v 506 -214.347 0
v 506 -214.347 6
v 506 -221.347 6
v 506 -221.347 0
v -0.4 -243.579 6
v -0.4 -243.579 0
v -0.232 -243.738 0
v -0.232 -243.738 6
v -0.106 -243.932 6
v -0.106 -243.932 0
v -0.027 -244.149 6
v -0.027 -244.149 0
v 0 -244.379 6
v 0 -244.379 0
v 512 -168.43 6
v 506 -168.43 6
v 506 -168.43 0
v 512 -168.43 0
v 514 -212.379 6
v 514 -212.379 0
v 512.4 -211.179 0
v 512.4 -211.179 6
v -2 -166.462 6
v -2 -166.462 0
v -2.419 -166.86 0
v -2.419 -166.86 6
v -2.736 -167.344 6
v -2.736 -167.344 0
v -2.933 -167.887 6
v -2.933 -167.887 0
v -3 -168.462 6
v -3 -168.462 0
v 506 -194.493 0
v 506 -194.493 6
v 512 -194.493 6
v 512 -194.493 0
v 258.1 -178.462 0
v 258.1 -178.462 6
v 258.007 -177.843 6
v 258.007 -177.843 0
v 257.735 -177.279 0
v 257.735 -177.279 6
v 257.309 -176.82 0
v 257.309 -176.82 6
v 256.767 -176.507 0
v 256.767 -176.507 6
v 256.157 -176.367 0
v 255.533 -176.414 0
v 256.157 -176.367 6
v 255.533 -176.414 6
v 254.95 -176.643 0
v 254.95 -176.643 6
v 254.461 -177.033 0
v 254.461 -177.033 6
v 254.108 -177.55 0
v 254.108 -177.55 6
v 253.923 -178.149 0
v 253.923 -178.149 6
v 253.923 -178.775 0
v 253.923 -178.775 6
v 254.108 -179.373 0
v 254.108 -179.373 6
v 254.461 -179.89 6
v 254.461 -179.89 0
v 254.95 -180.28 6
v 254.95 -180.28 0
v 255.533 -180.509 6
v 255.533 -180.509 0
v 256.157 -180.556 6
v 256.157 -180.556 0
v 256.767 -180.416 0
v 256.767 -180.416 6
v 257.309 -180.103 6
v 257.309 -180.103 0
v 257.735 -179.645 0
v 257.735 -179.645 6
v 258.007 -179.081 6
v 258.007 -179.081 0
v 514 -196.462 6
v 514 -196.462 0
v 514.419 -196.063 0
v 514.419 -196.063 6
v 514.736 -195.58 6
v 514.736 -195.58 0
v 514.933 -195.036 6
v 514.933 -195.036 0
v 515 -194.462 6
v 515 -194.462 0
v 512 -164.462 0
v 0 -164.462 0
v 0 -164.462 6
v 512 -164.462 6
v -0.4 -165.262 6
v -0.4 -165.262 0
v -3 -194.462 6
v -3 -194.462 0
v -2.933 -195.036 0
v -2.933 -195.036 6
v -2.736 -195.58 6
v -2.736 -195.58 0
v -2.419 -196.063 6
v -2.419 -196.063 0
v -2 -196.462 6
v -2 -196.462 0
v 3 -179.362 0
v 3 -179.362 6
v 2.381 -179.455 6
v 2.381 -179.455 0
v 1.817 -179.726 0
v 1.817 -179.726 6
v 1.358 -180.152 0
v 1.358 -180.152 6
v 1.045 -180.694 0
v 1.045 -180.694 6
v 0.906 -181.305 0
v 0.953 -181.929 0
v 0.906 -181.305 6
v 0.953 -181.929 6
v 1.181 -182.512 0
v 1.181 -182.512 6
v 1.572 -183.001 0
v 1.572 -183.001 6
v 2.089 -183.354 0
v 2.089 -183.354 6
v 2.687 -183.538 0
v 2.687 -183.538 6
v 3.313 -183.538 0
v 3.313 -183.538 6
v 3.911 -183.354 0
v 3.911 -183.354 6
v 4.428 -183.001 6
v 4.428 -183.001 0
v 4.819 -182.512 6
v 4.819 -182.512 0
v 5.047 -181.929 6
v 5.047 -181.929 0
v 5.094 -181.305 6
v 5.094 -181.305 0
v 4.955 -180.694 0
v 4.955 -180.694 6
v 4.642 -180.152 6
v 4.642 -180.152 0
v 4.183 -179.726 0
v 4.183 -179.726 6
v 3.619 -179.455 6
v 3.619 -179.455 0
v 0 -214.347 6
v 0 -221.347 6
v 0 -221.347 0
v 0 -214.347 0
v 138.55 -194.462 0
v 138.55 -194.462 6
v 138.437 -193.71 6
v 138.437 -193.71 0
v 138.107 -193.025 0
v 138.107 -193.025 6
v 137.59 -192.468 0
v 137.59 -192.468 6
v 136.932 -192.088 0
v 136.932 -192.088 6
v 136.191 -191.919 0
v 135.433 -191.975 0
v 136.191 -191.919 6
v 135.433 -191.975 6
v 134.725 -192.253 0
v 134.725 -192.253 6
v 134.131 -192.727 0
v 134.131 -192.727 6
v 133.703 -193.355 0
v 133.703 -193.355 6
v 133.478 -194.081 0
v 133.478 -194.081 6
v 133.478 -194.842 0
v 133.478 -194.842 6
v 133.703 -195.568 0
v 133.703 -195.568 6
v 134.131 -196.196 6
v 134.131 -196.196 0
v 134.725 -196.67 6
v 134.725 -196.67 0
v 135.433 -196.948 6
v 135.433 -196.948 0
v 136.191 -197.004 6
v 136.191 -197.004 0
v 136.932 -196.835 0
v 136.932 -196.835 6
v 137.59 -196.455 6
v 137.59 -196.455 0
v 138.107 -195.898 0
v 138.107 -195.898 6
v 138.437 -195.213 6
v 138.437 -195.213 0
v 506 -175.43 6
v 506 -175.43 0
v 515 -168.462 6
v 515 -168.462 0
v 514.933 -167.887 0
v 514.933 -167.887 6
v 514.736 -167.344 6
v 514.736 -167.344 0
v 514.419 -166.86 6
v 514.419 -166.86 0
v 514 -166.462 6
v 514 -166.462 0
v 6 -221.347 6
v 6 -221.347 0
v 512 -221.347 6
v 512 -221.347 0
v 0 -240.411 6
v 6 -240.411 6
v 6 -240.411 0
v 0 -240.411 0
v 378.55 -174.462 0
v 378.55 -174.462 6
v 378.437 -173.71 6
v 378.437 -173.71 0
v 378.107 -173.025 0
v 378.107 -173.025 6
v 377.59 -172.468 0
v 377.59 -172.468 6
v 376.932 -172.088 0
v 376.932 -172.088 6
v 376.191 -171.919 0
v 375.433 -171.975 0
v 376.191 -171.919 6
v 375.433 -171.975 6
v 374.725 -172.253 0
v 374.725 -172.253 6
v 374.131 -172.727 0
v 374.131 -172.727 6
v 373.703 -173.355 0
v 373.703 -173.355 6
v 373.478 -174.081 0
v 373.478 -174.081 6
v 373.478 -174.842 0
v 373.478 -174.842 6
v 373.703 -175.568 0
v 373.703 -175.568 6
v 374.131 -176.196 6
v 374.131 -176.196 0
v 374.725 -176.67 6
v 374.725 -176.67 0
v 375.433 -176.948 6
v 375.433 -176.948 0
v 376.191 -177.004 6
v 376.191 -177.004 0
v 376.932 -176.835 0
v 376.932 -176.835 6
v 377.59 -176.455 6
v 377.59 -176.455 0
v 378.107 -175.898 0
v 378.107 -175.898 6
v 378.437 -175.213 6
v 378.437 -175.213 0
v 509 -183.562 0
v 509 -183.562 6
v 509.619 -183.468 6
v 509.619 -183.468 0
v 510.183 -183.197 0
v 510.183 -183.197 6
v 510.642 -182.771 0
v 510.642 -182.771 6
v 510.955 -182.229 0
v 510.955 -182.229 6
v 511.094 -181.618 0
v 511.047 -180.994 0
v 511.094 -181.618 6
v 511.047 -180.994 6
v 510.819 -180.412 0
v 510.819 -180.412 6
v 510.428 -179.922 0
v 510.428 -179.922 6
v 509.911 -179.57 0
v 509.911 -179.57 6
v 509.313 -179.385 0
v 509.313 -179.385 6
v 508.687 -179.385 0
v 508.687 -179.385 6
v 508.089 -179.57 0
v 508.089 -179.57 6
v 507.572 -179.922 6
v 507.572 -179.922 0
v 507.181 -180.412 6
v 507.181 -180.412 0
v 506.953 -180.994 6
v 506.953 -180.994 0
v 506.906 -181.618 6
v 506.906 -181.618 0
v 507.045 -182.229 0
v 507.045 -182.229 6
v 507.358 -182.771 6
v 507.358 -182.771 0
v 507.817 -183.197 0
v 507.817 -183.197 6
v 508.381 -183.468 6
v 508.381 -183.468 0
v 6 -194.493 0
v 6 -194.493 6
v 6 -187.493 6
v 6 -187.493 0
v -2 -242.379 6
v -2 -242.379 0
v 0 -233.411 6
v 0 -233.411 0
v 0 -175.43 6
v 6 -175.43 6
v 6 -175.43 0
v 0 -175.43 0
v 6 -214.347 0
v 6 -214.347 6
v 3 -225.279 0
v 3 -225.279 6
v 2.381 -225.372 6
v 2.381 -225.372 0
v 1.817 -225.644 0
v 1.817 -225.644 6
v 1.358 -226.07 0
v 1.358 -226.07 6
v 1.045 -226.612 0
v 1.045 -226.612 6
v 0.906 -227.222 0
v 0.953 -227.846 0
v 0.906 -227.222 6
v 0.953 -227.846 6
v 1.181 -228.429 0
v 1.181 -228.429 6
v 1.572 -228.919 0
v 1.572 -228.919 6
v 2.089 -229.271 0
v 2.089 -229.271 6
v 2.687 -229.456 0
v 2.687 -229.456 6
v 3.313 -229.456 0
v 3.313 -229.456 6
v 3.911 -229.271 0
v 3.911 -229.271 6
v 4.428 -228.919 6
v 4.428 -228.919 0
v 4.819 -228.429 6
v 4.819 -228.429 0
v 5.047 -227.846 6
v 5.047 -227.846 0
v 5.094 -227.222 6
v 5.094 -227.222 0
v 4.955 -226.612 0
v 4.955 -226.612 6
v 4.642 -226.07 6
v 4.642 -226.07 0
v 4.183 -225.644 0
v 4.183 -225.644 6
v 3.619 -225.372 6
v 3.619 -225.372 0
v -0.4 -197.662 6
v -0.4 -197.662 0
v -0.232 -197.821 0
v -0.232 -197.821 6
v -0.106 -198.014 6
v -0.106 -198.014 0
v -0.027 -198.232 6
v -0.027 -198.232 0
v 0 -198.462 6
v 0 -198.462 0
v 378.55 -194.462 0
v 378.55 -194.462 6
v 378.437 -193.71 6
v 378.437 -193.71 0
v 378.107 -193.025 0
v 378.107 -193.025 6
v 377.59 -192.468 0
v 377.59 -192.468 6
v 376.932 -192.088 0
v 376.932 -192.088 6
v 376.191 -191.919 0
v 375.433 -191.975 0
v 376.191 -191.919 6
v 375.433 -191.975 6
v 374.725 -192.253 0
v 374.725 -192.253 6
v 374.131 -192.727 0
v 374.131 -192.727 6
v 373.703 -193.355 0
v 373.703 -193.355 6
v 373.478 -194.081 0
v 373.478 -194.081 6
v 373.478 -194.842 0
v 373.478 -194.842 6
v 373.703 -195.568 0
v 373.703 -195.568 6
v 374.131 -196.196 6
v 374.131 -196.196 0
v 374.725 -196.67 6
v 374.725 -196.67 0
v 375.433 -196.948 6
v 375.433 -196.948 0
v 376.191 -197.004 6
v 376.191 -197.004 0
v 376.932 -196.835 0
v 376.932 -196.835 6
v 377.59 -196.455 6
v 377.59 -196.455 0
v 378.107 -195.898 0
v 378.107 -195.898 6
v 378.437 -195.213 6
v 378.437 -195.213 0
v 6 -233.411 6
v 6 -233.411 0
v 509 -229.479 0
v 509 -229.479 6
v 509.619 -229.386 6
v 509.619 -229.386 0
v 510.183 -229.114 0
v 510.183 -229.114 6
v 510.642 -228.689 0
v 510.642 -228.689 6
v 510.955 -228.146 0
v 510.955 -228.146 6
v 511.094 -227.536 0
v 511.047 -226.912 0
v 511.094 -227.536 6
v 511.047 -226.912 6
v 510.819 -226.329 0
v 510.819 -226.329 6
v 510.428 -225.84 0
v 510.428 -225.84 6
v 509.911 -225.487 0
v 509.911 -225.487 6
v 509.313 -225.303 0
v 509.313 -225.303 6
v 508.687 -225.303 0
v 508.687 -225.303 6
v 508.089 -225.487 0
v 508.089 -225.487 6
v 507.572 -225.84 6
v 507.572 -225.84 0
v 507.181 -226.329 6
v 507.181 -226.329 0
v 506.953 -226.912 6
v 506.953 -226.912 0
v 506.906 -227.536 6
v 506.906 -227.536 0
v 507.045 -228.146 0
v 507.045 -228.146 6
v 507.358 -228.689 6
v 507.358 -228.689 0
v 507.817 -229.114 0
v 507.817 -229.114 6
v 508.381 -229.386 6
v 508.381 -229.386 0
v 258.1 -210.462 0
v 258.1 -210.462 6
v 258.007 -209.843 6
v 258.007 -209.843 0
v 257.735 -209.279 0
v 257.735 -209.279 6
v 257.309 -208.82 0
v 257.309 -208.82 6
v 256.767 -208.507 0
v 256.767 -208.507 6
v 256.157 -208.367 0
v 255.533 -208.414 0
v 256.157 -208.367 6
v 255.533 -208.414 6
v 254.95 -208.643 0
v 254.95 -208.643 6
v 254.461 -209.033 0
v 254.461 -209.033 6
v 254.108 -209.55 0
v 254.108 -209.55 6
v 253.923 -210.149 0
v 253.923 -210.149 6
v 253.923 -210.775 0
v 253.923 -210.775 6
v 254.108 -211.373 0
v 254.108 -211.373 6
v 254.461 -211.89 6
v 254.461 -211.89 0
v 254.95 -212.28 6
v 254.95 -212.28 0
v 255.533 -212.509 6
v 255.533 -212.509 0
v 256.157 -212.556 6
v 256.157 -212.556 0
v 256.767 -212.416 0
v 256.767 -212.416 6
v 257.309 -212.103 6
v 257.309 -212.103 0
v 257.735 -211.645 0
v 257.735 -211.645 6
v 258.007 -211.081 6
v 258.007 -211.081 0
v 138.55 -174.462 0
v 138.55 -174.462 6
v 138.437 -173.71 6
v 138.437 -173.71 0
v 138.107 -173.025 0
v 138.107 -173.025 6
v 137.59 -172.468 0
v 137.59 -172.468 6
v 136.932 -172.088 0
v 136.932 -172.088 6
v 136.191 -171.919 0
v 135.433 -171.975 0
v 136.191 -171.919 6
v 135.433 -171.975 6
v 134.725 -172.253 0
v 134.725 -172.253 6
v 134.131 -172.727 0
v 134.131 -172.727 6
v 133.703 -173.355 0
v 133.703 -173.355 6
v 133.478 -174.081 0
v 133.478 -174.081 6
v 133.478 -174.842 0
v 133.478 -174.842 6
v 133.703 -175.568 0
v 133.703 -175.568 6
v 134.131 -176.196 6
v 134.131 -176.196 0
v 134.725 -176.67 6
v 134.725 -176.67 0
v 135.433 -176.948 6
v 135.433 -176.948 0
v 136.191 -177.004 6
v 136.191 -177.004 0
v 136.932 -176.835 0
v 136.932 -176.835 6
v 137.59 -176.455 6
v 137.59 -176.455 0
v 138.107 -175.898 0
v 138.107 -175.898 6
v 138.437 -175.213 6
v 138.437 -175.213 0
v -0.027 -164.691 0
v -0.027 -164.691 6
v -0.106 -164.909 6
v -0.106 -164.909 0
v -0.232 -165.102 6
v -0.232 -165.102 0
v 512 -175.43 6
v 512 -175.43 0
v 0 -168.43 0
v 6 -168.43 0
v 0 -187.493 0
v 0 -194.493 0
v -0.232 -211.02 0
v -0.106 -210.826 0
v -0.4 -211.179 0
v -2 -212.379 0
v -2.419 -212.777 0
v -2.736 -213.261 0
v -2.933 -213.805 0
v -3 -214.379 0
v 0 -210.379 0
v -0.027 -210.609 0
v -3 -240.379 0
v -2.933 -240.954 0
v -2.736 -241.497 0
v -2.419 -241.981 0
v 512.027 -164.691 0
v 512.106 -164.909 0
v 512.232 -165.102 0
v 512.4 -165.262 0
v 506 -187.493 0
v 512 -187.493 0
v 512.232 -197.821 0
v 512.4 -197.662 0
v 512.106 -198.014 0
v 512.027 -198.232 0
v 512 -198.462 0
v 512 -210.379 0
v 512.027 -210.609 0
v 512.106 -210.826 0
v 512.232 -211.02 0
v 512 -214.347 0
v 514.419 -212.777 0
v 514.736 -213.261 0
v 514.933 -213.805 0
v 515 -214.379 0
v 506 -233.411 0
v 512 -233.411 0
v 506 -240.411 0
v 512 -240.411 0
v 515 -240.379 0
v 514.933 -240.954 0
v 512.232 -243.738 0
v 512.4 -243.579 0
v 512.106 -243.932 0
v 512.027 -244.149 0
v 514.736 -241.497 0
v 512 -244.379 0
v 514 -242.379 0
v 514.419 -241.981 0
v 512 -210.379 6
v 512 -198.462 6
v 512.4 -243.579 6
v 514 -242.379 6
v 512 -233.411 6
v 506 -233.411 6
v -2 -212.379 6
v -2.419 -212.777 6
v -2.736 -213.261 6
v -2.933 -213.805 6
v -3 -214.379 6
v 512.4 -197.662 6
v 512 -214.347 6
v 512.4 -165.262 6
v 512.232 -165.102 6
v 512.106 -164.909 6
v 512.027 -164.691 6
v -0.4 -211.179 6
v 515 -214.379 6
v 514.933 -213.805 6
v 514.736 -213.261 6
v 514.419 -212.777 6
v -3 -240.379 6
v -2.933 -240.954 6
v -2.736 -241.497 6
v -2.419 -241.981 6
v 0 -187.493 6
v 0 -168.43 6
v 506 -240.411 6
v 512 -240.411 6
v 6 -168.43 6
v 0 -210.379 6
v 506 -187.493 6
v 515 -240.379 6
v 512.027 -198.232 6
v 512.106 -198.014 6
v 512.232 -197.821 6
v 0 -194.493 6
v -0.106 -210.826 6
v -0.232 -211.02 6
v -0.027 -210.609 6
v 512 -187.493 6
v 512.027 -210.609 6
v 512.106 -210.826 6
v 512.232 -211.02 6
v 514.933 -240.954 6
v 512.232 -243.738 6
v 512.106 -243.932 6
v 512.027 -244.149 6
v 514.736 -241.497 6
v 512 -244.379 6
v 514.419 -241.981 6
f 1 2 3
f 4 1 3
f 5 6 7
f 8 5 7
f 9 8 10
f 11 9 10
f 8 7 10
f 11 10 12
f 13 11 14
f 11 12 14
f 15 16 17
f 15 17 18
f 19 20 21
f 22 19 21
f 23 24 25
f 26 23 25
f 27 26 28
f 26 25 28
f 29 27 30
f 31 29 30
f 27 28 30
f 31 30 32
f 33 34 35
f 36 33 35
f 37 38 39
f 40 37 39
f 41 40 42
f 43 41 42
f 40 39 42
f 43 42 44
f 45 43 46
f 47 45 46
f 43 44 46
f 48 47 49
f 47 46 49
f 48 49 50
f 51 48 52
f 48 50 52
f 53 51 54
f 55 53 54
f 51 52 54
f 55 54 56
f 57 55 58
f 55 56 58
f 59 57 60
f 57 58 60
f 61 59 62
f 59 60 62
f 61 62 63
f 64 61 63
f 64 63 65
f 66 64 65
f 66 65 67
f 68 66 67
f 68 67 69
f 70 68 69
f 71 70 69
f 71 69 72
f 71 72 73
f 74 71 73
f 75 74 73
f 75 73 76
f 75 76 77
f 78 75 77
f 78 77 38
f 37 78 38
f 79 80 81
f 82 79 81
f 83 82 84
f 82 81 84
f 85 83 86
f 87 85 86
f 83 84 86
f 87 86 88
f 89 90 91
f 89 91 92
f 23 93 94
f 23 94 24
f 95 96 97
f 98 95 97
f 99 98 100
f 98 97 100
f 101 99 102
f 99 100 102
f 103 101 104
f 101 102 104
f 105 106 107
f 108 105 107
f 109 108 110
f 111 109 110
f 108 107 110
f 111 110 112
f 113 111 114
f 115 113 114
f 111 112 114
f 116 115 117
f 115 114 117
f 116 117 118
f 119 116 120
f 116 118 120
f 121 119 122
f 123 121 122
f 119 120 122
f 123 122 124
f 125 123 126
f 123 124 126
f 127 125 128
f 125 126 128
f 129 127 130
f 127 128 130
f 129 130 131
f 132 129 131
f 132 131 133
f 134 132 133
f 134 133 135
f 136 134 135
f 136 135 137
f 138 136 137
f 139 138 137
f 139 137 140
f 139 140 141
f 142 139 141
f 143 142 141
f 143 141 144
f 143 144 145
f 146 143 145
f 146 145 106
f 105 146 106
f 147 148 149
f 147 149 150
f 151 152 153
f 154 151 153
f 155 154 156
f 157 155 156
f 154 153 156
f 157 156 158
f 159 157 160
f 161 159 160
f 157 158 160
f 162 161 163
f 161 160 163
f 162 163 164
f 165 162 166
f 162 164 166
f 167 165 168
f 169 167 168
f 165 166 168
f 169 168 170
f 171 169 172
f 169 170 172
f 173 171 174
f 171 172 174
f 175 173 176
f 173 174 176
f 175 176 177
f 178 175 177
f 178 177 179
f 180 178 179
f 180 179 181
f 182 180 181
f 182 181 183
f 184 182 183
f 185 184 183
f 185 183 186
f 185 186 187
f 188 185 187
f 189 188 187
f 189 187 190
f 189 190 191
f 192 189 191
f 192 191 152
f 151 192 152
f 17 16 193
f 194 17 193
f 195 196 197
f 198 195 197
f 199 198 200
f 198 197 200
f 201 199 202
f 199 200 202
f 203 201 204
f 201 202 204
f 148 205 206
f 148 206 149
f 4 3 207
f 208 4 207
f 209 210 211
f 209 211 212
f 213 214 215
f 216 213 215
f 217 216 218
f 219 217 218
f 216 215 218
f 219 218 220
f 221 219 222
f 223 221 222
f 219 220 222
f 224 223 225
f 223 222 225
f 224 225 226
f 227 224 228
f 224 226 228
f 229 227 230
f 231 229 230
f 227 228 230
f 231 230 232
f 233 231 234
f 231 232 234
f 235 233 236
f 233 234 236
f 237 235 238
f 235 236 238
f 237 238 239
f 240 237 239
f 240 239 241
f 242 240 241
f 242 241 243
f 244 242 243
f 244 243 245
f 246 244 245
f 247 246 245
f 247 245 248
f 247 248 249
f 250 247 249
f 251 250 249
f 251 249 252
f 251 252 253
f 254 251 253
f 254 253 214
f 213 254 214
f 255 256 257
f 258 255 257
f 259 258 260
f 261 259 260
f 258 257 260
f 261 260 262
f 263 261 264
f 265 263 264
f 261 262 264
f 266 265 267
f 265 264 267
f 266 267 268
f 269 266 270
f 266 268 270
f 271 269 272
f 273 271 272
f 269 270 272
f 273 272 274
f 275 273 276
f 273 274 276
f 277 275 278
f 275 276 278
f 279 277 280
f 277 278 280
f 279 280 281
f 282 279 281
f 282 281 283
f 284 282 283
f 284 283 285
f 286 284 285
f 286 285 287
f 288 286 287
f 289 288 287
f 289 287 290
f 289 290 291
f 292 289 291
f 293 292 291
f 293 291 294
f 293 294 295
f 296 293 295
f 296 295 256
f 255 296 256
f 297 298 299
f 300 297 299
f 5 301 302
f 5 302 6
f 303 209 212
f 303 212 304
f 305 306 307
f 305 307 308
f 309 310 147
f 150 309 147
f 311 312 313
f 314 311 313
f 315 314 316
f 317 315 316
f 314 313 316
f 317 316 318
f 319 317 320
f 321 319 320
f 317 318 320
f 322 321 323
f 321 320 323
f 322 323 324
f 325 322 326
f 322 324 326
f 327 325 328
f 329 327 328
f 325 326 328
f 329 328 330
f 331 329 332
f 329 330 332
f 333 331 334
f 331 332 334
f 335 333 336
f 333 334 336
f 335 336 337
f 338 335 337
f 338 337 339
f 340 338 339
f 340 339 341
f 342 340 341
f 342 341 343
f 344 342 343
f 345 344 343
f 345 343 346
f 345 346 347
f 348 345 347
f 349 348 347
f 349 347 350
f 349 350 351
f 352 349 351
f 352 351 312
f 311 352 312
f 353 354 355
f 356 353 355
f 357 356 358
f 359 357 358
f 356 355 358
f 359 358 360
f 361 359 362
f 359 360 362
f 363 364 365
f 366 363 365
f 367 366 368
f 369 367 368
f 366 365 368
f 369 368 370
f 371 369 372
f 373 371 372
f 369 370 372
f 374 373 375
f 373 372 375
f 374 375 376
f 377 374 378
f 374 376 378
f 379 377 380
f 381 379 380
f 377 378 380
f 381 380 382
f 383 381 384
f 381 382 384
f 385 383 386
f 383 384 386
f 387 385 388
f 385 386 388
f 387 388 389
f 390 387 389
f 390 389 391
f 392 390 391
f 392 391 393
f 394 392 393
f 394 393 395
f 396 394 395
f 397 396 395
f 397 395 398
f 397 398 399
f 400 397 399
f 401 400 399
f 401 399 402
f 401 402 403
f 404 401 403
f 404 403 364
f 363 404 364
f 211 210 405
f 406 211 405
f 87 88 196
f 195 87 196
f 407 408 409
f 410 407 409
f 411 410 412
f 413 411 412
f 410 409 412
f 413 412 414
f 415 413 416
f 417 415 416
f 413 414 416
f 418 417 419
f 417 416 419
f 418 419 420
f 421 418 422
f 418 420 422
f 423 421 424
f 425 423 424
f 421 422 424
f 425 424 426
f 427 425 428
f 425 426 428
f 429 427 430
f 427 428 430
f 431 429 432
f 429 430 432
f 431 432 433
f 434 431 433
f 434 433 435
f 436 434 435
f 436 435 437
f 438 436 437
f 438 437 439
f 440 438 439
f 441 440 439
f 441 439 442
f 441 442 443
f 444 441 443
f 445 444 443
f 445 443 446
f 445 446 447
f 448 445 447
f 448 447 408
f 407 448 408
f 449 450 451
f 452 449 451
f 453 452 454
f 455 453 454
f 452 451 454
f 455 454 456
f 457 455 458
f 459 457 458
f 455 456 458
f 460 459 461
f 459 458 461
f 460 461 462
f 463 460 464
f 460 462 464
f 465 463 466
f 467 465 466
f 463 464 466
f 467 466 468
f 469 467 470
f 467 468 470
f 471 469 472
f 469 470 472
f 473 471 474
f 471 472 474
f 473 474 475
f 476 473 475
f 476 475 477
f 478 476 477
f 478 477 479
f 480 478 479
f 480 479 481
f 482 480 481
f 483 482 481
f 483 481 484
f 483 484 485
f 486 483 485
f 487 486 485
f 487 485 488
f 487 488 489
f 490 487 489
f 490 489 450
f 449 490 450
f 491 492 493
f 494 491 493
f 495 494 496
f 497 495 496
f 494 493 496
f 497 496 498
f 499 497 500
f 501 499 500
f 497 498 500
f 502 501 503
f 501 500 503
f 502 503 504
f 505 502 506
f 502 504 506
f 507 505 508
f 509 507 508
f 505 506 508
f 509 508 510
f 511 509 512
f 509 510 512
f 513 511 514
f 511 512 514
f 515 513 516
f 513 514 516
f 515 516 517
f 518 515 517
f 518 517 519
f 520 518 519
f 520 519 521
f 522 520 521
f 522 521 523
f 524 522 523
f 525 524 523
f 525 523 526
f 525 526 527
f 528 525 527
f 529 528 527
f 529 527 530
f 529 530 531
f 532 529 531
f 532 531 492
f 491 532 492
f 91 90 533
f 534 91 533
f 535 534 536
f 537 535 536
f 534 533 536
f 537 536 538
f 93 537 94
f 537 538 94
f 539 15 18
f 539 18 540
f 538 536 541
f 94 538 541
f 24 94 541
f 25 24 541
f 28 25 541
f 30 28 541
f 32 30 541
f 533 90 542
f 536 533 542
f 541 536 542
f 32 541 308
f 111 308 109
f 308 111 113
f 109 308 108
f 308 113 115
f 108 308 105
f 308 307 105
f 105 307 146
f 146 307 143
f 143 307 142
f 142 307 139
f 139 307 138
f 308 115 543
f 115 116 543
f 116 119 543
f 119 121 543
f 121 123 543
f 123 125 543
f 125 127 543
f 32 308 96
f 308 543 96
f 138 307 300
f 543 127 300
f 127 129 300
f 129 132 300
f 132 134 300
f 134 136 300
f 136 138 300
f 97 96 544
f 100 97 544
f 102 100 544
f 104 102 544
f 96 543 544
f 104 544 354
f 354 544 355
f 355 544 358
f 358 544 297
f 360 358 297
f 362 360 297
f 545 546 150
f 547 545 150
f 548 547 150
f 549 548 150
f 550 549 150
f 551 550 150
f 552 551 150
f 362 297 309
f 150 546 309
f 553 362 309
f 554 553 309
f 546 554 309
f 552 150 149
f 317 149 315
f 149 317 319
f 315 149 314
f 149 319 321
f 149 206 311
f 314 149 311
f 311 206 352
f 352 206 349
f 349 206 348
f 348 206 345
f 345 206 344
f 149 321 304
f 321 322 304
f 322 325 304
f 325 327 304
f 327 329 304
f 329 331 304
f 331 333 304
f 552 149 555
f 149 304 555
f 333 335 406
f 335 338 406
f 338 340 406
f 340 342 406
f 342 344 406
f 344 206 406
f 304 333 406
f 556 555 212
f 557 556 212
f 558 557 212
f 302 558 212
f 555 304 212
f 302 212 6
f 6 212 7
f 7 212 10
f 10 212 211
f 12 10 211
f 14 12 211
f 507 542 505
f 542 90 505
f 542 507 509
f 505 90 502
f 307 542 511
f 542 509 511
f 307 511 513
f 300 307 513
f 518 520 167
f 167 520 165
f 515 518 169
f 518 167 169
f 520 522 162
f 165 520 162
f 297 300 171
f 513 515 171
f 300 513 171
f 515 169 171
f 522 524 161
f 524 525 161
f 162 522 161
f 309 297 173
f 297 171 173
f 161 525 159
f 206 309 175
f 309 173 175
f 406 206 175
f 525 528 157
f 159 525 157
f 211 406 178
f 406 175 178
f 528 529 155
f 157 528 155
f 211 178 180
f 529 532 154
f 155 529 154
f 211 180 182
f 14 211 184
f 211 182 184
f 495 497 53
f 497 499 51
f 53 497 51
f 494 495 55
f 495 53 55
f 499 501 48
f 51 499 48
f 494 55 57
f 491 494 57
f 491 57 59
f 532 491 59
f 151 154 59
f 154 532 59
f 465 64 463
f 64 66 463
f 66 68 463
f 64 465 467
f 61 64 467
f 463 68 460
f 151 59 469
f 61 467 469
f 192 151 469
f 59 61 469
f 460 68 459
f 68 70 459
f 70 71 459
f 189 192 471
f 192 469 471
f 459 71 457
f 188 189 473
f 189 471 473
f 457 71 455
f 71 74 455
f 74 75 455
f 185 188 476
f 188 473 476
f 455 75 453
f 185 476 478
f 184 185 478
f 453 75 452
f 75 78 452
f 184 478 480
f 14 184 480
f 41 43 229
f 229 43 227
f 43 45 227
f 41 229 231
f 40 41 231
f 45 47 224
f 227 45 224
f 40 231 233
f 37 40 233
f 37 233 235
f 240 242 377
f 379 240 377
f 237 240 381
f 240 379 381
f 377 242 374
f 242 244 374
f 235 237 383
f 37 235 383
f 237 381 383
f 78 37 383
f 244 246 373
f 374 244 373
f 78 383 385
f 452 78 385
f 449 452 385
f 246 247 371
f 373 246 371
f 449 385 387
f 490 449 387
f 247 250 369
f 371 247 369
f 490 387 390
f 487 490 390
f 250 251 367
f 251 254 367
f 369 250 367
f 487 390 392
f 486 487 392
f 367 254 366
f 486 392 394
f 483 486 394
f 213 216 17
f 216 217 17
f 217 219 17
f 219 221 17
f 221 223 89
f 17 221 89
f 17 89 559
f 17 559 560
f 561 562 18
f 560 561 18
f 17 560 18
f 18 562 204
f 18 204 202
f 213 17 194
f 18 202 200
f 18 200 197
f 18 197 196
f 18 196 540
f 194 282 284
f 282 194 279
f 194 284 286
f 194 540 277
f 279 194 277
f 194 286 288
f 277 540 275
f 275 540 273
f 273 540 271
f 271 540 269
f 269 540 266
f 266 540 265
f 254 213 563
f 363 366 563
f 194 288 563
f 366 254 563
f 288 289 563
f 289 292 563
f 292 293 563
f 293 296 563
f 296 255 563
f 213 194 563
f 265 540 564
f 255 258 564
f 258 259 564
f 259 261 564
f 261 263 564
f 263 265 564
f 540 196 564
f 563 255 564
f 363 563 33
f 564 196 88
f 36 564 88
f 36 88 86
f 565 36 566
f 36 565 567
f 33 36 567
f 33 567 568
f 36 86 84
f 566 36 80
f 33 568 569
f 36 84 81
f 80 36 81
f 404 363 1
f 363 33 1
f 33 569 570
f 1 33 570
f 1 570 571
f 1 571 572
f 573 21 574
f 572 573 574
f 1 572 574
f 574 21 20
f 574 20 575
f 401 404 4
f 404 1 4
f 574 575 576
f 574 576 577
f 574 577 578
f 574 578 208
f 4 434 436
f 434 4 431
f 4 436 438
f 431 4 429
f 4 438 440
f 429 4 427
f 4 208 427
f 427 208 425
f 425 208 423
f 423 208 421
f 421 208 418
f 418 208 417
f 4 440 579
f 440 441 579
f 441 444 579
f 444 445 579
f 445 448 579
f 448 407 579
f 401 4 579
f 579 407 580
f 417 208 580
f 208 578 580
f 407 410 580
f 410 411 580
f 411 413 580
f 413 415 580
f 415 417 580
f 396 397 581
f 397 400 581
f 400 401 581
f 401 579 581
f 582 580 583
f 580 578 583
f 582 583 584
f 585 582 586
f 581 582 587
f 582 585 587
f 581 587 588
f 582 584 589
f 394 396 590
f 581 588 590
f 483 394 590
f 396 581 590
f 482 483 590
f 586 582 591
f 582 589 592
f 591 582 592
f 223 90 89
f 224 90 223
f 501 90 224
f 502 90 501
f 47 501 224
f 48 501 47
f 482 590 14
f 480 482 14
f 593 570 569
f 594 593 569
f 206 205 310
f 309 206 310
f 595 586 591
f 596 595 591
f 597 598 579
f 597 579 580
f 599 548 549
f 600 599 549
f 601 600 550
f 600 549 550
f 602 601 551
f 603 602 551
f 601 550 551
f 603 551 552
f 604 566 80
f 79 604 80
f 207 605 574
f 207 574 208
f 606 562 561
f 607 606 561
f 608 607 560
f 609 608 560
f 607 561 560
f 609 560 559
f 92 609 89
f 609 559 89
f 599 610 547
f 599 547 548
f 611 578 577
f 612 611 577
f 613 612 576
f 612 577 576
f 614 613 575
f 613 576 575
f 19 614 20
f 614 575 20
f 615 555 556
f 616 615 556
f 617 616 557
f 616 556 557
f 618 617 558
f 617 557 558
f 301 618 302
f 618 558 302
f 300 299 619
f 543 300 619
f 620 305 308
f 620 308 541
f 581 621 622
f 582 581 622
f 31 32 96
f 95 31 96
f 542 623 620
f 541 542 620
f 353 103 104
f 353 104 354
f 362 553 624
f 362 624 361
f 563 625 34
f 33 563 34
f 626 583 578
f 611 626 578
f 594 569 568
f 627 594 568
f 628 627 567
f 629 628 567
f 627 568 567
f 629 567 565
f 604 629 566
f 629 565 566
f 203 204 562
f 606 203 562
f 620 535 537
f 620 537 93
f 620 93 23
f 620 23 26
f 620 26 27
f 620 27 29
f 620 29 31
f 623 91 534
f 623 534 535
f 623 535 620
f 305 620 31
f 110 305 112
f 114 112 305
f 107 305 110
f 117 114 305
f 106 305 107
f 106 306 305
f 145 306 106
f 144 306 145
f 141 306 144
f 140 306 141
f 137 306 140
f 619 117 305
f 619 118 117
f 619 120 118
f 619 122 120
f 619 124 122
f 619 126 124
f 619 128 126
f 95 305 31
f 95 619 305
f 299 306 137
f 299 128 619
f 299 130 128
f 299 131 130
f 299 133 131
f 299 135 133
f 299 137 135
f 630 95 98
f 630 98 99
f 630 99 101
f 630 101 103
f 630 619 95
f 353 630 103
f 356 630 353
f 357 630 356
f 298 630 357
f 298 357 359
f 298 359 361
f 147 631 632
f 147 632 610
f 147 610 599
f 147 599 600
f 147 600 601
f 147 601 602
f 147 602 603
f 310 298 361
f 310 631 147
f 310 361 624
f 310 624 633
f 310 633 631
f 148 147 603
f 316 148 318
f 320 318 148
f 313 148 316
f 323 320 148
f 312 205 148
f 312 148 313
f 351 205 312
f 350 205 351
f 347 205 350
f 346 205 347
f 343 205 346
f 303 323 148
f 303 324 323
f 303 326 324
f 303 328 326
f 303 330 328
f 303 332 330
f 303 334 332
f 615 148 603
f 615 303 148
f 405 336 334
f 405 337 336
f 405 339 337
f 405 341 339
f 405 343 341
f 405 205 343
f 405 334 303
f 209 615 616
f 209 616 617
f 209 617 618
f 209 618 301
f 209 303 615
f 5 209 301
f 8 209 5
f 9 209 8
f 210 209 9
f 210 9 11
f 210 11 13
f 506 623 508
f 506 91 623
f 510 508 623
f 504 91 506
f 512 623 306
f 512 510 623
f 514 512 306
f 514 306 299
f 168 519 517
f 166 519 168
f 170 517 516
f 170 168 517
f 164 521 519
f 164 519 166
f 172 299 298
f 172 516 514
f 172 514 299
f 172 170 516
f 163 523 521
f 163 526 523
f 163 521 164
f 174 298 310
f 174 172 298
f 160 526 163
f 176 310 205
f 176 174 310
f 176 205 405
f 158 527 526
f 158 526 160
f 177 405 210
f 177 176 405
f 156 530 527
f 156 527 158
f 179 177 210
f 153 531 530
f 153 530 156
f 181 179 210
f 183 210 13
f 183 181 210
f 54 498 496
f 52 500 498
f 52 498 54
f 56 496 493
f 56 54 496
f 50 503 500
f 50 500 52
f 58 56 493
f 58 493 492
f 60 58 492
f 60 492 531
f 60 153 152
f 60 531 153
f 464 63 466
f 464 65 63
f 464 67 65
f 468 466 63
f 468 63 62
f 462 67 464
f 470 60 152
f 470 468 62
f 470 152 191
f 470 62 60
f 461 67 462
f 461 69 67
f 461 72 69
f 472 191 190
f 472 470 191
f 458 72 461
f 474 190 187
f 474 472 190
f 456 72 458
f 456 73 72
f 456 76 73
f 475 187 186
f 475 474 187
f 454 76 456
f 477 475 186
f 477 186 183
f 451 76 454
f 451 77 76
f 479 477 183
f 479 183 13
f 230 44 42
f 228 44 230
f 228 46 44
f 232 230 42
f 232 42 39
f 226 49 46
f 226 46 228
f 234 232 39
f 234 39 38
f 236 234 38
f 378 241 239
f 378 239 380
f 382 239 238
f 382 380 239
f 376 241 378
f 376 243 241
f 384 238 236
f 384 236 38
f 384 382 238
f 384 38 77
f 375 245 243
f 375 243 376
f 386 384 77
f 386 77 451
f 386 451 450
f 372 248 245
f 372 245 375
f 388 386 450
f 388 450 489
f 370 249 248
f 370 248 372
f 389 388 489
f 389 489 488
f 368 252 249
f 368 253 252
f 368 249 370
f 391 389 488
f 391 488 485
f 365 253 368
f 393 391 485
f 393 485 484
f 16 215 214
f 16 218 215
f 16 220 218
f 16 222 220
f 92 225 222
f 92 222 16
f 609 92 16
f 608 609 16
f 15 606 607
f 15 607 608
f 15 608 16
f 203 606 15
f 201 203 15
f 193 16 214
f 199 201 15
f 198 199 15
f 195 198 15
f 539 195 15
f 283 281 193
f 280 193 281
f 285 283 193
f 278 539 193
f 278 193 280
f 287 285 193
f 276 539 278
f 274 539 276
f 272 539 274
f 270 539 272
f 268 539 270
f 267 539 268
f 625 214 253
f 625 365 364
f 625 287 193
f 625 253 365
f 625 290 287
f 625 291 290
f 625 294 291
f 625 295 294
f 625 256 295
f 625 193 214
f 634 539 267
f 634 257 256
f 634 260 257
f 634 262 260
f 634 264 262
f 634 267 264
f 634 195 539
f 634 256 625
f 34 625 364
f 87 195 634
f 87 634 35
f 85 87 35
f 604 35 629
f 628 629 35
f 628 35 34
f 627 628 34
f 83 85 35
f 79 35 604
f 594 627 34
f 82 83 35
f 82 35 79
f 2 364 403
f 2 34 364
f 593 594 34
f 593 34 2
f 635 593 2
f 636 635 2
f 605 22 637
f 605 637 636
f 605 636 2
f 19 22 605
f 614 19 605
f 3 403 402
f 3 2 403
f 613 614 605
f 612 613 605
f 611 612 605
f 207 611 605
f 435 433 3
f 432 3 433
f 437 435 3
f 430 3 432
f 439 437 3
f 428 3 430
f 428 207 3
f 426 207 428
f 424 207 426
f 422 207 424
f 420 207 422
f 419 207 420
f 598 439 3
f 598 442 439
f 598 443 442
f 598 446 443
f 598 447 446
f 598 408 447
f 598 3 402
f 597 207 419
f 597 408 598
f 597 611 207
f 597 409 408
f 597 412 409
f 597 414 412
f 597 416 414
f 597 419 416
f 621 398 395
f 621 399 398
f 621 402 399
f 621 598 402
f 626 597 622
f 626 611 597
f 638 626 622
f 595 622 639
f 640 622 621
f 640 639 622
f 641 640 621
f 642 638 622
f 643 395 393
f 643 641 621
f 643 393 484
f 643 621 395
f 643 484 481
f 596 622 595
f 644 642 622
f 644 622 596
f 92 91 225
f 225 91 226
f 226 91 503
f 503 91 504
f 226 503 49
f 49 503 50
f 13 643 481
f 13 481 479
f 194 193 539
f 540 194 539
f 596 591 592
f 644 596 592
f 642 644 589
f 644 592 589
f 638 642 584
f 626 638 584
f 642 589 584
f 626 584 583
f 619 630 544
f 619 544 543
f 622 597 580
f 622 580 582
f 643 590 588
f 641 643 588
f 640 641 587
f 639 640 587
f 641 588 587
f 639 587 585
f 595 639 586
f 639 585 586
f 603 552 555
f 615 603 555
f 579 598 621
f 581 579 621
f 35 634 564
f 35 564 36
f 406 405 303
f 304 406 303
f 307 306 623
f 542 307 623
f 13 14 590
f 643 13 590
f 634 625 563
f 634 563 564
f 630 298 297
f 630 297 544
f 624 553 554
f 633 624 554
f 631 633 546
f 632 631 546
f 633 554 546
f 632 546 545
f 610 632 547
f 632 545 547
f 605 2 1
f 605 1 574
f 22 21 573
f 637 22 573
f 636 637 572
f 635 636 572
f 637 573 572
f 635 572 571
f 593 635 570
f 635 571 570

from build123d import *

# Parameters (mm, degrees)
SKETCH_1_W           = 512
SKETCH_1_H           = 79.917657137
EXTRUDE_1_DEPTH      = 6
SKETCH_2_R           = 2.1
SKETCH_2_R_2         = 2.55
CUT_EXTRUDE_1_DEPTH  = 7
EXTRUDE_2_DEPTH      = 6
SKETCH_3_R           = 2.1
SKETCH_3_W           = 7
SKETCH_3_H           = 6
CUT_EXTRUDE_11_DEPTH = 7
EXTRUDE_21_DEPTH     = 6
SKETCH_31_R          = 2.1
SKETCH_31_W          = 7
SKETCH_31_H          = 6
CUT_EXTRUDE_12_DEPTH = 7
EXTRUDE_22_DEPTH     = 6
SKETCH_32_R          = 2.1
SKETCH_32_W          = 7
SKETCH_32_H          = 6
CUT_EXTRUDE_13_DEPTH = 7
EXTRUDE_23_DEPTH     = 6
SKETCH_33_R          = 2.1
SKETCH_33_W          = 7
SKETCH_33_H          = 6
CUT_EXTRUDE_14_DEPTH = 7


with BuildPart() as part:
    # Эскиз1 → Бобышка-Вытянуть1 (new body)
    with BuildSketch(Plane.XY):
        with Locations((256, -204.420367031)):
            Rectangle(SKETCH_1_W, SKETCH_1_H)
    extrude(amount=EXTRUDE_1_DEPTH)

    # Эскиз2 → Вырез-Вытянуть1 (cut, through all)
    with BuildSketch(Plane.XY.offset(6)):
        with Locations((256, -178.461538462)):
            Circle(SKETCH_2_R)
        with Locations((256, -210.461538462)):
            Circle(SKETCH_2_R)
        with Locations((136, -174.461538462)):
            Circle(SKETCH_2_R_2)
        with Locations((136, -194.461538462)):
            Circle(SKETCH_2_R_2)
        with Locations((376, -174.461538462)):
            Circle(SKETCH_2_R_2)
        with Locations((376, -194.461538462)):
            Circle(SKETCH_2_R_2)
    extrude(amount=-CUT_EXTRUDE_1_DEPTH, mode=Mode.SUBTRACT)

    # Эскиз21 → Бобышка-Вытянуть2 (add)
    with BuildSketch(Plane(origin=(50, -181.461538462, 0), x_dir=(0, 1, 0), z_dir=(0, 0, 1))):
        with BuildLine():
            Line((13, 53), (-13, 53))
            ThreePointArc((-13, 53), (-14.118033989, 52.736067977), (-15, 52))
            Line((-15, 52), (-16.2, 50.4))
            ThreePointArc((-16.2, 50.4), (-16.552786405, 50.105572809), (-17, 50))
            Line((-17, 50), (17, 50))
            ThreePointArc((17, 50), (16.552786405, 50.105572809), (16.2, 50.4))
            Line((16.2, 50.4), (15, 52))
            ThreePointArc((15, 52), (14.118033989, 52.736067977), (13, 53))
        make_face()
    extrude(amount=EXTRUDE_2_DEPTH)

    # Эскиз3 → Вырез-Вытянуть11 (cut, through all)
    with BuildSketch(Plane(origin=(50, -181.461538462, 6), x_dir=(0, 1, 0), z_dir=(0, 0, 1))):
        with Locations((0, 47)):
            Circle(SKETCH_3_R)
        with Locations((9.531849908, 47)):
            Rectangle(SKETCH_3_W, SKETCH_3_H)
        with Locations((-9.531849908, 47)):
            Rectangle(SKETCH_3_W, SKETCH_3_H)
    extrude(amount=-CUT_EXTRUDE_11_DEPTH, mode=Mode.SUBTRACT)

    # Эскиз22 → Бобышка-Вытянуть21 (add)
    with BuildSketch(Plane(origin=(50, -227.379195599, 0), x_dir=(0, 1, 0), z_dir=(0, 0, 1))):
        with BuildLine():
            Line((13, 53), (-13, 53))
            ThreePointArc((-13, 53), (-14.118033989, 52.736067977), (-15, 52))
            Line((-15, 52), (-16.2, 50.4))
            ThreePointArc((-16.2, 50.4), (-16.552786405, 50.105572809), (-17, 50))
            Line((-17, 50), (17, 50))
            ThreePointArc((17, 50), (16.552786405, 50.105572809), (16.2, 50.4))
            Line((16.2, 50.4), (15, 52))
            ThreePointArc((15, 52), (14.118033989, 52.736067977), (13, 53))
        make_face()
    extrude(amount=EXTRUDE_21_DEPTH)

    # Эскиз31 → Вырез-Вытянуть12 (cut, through all)
    with BuildSketch(Plane(origin=(50, -227.379195599, 6), x_dir=(0, 1, 0), z_dir=(0, 0, 1))):
        with Locations((0, 47)):
            Circle(SKETCH_31_R)
        with Locations((9.531849908, 47)):
            Rectangle(SKETCH_31_W, SKETCH_31_H)
        with Locations((-9.531849908, 47)):
            Rectangle(SKETCH_31_W, SKETCH_31_H)
    extrude(amount=-CUT_EXTRUDE_12_DEPTH, mode=Mode.SUBTRACT)

    # Эскиз23 → Бобышка-Вытянуть22 (add)
    with BuildSketch(Plane(origin=(462, -181.461538462, 0), x_dir=(0, -1, 0), z_dir=(0, 0, 1))):
        with BuildLine():
            Line((13, 53), (-13, 53))
            ThreePointArc((-13, 53), (-14.118033989, 52.736067977), (-15, 52))
            Line((-15, 52), (-16.2, 50.4))
            ThreePointArc((-16.2, 50.4), (-16.552786405, 50.105572809), (-17, 50))
            Line((-17, 50), (17, 50))
            ThreePointArc((17, 50), (16.552786405, 50.105572809), (16.2, 50.4))
            Line((16.2, 50.4), (15, 52))
            ThreePointArc((15, 52), (14.118033989, 52.736067977), (13, 53))
        make_face()
    extrude(amount=EXTRUDE_22_DEPTH)

    # Эскиз32 → Вырез-Вытянуть13 (cut, through all)
    with BuildSketch(Plane(origin=(462, -181.461538462, 6), x_dir=(0, -1, 0), z_dir=(0, 0, 1))):
        with Locations((0, 47)):
            Circle(SKETCH_32_R)
        with Locations((9.531849908, 47)):
            Rectangle(SKETCH_32_W, SKETCH_32_H)
        with Locations((-9.531849908, 47)):
            Rectangle(SKETCH_32_W, SKETCH_32_H)
    extrude(amount=-CUT_EXTRUDE_13_DEPTH, mode=Mode.SUBTRACT)

    # Эскиз24 → Бобышка-Вытянуть23 (add)
    with BuildSketch(Plane(origin=(462, -227.379195599, 0), x_dir=(0, -1, 0), z_dir=(0, 0, 1))):
        with BuildLine():
            Line((13, 53), (-13, 53))
            ThreePointArc((-13, 53), (-14.118033989, 52.736067977), (-15, 52))
            Line((-15, 52), (-16.2, 50.4))
            ThreePointArc((-16.2, 50.4), (-16.552786405, 50.105572809), (-17, 50))
            Line((-17, 50), (17, 50))
            ThreePointArc((17, 50), (16.552786405, 50.105572809), (16.2, 50.4))
            Line((16.2, 50.4), (15, 52))
            ThreePointArc((15, 52), (14.118033989, 52.736067977), (13, 53))
        make_face()
    extrude(amount=EXTRUDE_23_DEPTH)

    # Эскиз33 → Вырез-Вытянуть14 (cut, through all)
    with BuildSketch(Plane(origin=(462, -227.379195599, 6), x_dir=(0, -1, 0), z_dir=(0, 0, 1))):
        with Locations((0, 47)):
            Circle(SKETCH_33_R)
        with Locations((9.531849908, 47)):
            Rectangle(SKETCH_33_W, SKETCH_33_H)
        with Locations((-9.531849908, 47)):
            Rectangle(SKETCH_33_W, SKETCH_33_H)
    extrude(amount=-CUT_EXTRUDE_14_DEPTH, mode=Mode.SUBTRACT)


solid = part.part
